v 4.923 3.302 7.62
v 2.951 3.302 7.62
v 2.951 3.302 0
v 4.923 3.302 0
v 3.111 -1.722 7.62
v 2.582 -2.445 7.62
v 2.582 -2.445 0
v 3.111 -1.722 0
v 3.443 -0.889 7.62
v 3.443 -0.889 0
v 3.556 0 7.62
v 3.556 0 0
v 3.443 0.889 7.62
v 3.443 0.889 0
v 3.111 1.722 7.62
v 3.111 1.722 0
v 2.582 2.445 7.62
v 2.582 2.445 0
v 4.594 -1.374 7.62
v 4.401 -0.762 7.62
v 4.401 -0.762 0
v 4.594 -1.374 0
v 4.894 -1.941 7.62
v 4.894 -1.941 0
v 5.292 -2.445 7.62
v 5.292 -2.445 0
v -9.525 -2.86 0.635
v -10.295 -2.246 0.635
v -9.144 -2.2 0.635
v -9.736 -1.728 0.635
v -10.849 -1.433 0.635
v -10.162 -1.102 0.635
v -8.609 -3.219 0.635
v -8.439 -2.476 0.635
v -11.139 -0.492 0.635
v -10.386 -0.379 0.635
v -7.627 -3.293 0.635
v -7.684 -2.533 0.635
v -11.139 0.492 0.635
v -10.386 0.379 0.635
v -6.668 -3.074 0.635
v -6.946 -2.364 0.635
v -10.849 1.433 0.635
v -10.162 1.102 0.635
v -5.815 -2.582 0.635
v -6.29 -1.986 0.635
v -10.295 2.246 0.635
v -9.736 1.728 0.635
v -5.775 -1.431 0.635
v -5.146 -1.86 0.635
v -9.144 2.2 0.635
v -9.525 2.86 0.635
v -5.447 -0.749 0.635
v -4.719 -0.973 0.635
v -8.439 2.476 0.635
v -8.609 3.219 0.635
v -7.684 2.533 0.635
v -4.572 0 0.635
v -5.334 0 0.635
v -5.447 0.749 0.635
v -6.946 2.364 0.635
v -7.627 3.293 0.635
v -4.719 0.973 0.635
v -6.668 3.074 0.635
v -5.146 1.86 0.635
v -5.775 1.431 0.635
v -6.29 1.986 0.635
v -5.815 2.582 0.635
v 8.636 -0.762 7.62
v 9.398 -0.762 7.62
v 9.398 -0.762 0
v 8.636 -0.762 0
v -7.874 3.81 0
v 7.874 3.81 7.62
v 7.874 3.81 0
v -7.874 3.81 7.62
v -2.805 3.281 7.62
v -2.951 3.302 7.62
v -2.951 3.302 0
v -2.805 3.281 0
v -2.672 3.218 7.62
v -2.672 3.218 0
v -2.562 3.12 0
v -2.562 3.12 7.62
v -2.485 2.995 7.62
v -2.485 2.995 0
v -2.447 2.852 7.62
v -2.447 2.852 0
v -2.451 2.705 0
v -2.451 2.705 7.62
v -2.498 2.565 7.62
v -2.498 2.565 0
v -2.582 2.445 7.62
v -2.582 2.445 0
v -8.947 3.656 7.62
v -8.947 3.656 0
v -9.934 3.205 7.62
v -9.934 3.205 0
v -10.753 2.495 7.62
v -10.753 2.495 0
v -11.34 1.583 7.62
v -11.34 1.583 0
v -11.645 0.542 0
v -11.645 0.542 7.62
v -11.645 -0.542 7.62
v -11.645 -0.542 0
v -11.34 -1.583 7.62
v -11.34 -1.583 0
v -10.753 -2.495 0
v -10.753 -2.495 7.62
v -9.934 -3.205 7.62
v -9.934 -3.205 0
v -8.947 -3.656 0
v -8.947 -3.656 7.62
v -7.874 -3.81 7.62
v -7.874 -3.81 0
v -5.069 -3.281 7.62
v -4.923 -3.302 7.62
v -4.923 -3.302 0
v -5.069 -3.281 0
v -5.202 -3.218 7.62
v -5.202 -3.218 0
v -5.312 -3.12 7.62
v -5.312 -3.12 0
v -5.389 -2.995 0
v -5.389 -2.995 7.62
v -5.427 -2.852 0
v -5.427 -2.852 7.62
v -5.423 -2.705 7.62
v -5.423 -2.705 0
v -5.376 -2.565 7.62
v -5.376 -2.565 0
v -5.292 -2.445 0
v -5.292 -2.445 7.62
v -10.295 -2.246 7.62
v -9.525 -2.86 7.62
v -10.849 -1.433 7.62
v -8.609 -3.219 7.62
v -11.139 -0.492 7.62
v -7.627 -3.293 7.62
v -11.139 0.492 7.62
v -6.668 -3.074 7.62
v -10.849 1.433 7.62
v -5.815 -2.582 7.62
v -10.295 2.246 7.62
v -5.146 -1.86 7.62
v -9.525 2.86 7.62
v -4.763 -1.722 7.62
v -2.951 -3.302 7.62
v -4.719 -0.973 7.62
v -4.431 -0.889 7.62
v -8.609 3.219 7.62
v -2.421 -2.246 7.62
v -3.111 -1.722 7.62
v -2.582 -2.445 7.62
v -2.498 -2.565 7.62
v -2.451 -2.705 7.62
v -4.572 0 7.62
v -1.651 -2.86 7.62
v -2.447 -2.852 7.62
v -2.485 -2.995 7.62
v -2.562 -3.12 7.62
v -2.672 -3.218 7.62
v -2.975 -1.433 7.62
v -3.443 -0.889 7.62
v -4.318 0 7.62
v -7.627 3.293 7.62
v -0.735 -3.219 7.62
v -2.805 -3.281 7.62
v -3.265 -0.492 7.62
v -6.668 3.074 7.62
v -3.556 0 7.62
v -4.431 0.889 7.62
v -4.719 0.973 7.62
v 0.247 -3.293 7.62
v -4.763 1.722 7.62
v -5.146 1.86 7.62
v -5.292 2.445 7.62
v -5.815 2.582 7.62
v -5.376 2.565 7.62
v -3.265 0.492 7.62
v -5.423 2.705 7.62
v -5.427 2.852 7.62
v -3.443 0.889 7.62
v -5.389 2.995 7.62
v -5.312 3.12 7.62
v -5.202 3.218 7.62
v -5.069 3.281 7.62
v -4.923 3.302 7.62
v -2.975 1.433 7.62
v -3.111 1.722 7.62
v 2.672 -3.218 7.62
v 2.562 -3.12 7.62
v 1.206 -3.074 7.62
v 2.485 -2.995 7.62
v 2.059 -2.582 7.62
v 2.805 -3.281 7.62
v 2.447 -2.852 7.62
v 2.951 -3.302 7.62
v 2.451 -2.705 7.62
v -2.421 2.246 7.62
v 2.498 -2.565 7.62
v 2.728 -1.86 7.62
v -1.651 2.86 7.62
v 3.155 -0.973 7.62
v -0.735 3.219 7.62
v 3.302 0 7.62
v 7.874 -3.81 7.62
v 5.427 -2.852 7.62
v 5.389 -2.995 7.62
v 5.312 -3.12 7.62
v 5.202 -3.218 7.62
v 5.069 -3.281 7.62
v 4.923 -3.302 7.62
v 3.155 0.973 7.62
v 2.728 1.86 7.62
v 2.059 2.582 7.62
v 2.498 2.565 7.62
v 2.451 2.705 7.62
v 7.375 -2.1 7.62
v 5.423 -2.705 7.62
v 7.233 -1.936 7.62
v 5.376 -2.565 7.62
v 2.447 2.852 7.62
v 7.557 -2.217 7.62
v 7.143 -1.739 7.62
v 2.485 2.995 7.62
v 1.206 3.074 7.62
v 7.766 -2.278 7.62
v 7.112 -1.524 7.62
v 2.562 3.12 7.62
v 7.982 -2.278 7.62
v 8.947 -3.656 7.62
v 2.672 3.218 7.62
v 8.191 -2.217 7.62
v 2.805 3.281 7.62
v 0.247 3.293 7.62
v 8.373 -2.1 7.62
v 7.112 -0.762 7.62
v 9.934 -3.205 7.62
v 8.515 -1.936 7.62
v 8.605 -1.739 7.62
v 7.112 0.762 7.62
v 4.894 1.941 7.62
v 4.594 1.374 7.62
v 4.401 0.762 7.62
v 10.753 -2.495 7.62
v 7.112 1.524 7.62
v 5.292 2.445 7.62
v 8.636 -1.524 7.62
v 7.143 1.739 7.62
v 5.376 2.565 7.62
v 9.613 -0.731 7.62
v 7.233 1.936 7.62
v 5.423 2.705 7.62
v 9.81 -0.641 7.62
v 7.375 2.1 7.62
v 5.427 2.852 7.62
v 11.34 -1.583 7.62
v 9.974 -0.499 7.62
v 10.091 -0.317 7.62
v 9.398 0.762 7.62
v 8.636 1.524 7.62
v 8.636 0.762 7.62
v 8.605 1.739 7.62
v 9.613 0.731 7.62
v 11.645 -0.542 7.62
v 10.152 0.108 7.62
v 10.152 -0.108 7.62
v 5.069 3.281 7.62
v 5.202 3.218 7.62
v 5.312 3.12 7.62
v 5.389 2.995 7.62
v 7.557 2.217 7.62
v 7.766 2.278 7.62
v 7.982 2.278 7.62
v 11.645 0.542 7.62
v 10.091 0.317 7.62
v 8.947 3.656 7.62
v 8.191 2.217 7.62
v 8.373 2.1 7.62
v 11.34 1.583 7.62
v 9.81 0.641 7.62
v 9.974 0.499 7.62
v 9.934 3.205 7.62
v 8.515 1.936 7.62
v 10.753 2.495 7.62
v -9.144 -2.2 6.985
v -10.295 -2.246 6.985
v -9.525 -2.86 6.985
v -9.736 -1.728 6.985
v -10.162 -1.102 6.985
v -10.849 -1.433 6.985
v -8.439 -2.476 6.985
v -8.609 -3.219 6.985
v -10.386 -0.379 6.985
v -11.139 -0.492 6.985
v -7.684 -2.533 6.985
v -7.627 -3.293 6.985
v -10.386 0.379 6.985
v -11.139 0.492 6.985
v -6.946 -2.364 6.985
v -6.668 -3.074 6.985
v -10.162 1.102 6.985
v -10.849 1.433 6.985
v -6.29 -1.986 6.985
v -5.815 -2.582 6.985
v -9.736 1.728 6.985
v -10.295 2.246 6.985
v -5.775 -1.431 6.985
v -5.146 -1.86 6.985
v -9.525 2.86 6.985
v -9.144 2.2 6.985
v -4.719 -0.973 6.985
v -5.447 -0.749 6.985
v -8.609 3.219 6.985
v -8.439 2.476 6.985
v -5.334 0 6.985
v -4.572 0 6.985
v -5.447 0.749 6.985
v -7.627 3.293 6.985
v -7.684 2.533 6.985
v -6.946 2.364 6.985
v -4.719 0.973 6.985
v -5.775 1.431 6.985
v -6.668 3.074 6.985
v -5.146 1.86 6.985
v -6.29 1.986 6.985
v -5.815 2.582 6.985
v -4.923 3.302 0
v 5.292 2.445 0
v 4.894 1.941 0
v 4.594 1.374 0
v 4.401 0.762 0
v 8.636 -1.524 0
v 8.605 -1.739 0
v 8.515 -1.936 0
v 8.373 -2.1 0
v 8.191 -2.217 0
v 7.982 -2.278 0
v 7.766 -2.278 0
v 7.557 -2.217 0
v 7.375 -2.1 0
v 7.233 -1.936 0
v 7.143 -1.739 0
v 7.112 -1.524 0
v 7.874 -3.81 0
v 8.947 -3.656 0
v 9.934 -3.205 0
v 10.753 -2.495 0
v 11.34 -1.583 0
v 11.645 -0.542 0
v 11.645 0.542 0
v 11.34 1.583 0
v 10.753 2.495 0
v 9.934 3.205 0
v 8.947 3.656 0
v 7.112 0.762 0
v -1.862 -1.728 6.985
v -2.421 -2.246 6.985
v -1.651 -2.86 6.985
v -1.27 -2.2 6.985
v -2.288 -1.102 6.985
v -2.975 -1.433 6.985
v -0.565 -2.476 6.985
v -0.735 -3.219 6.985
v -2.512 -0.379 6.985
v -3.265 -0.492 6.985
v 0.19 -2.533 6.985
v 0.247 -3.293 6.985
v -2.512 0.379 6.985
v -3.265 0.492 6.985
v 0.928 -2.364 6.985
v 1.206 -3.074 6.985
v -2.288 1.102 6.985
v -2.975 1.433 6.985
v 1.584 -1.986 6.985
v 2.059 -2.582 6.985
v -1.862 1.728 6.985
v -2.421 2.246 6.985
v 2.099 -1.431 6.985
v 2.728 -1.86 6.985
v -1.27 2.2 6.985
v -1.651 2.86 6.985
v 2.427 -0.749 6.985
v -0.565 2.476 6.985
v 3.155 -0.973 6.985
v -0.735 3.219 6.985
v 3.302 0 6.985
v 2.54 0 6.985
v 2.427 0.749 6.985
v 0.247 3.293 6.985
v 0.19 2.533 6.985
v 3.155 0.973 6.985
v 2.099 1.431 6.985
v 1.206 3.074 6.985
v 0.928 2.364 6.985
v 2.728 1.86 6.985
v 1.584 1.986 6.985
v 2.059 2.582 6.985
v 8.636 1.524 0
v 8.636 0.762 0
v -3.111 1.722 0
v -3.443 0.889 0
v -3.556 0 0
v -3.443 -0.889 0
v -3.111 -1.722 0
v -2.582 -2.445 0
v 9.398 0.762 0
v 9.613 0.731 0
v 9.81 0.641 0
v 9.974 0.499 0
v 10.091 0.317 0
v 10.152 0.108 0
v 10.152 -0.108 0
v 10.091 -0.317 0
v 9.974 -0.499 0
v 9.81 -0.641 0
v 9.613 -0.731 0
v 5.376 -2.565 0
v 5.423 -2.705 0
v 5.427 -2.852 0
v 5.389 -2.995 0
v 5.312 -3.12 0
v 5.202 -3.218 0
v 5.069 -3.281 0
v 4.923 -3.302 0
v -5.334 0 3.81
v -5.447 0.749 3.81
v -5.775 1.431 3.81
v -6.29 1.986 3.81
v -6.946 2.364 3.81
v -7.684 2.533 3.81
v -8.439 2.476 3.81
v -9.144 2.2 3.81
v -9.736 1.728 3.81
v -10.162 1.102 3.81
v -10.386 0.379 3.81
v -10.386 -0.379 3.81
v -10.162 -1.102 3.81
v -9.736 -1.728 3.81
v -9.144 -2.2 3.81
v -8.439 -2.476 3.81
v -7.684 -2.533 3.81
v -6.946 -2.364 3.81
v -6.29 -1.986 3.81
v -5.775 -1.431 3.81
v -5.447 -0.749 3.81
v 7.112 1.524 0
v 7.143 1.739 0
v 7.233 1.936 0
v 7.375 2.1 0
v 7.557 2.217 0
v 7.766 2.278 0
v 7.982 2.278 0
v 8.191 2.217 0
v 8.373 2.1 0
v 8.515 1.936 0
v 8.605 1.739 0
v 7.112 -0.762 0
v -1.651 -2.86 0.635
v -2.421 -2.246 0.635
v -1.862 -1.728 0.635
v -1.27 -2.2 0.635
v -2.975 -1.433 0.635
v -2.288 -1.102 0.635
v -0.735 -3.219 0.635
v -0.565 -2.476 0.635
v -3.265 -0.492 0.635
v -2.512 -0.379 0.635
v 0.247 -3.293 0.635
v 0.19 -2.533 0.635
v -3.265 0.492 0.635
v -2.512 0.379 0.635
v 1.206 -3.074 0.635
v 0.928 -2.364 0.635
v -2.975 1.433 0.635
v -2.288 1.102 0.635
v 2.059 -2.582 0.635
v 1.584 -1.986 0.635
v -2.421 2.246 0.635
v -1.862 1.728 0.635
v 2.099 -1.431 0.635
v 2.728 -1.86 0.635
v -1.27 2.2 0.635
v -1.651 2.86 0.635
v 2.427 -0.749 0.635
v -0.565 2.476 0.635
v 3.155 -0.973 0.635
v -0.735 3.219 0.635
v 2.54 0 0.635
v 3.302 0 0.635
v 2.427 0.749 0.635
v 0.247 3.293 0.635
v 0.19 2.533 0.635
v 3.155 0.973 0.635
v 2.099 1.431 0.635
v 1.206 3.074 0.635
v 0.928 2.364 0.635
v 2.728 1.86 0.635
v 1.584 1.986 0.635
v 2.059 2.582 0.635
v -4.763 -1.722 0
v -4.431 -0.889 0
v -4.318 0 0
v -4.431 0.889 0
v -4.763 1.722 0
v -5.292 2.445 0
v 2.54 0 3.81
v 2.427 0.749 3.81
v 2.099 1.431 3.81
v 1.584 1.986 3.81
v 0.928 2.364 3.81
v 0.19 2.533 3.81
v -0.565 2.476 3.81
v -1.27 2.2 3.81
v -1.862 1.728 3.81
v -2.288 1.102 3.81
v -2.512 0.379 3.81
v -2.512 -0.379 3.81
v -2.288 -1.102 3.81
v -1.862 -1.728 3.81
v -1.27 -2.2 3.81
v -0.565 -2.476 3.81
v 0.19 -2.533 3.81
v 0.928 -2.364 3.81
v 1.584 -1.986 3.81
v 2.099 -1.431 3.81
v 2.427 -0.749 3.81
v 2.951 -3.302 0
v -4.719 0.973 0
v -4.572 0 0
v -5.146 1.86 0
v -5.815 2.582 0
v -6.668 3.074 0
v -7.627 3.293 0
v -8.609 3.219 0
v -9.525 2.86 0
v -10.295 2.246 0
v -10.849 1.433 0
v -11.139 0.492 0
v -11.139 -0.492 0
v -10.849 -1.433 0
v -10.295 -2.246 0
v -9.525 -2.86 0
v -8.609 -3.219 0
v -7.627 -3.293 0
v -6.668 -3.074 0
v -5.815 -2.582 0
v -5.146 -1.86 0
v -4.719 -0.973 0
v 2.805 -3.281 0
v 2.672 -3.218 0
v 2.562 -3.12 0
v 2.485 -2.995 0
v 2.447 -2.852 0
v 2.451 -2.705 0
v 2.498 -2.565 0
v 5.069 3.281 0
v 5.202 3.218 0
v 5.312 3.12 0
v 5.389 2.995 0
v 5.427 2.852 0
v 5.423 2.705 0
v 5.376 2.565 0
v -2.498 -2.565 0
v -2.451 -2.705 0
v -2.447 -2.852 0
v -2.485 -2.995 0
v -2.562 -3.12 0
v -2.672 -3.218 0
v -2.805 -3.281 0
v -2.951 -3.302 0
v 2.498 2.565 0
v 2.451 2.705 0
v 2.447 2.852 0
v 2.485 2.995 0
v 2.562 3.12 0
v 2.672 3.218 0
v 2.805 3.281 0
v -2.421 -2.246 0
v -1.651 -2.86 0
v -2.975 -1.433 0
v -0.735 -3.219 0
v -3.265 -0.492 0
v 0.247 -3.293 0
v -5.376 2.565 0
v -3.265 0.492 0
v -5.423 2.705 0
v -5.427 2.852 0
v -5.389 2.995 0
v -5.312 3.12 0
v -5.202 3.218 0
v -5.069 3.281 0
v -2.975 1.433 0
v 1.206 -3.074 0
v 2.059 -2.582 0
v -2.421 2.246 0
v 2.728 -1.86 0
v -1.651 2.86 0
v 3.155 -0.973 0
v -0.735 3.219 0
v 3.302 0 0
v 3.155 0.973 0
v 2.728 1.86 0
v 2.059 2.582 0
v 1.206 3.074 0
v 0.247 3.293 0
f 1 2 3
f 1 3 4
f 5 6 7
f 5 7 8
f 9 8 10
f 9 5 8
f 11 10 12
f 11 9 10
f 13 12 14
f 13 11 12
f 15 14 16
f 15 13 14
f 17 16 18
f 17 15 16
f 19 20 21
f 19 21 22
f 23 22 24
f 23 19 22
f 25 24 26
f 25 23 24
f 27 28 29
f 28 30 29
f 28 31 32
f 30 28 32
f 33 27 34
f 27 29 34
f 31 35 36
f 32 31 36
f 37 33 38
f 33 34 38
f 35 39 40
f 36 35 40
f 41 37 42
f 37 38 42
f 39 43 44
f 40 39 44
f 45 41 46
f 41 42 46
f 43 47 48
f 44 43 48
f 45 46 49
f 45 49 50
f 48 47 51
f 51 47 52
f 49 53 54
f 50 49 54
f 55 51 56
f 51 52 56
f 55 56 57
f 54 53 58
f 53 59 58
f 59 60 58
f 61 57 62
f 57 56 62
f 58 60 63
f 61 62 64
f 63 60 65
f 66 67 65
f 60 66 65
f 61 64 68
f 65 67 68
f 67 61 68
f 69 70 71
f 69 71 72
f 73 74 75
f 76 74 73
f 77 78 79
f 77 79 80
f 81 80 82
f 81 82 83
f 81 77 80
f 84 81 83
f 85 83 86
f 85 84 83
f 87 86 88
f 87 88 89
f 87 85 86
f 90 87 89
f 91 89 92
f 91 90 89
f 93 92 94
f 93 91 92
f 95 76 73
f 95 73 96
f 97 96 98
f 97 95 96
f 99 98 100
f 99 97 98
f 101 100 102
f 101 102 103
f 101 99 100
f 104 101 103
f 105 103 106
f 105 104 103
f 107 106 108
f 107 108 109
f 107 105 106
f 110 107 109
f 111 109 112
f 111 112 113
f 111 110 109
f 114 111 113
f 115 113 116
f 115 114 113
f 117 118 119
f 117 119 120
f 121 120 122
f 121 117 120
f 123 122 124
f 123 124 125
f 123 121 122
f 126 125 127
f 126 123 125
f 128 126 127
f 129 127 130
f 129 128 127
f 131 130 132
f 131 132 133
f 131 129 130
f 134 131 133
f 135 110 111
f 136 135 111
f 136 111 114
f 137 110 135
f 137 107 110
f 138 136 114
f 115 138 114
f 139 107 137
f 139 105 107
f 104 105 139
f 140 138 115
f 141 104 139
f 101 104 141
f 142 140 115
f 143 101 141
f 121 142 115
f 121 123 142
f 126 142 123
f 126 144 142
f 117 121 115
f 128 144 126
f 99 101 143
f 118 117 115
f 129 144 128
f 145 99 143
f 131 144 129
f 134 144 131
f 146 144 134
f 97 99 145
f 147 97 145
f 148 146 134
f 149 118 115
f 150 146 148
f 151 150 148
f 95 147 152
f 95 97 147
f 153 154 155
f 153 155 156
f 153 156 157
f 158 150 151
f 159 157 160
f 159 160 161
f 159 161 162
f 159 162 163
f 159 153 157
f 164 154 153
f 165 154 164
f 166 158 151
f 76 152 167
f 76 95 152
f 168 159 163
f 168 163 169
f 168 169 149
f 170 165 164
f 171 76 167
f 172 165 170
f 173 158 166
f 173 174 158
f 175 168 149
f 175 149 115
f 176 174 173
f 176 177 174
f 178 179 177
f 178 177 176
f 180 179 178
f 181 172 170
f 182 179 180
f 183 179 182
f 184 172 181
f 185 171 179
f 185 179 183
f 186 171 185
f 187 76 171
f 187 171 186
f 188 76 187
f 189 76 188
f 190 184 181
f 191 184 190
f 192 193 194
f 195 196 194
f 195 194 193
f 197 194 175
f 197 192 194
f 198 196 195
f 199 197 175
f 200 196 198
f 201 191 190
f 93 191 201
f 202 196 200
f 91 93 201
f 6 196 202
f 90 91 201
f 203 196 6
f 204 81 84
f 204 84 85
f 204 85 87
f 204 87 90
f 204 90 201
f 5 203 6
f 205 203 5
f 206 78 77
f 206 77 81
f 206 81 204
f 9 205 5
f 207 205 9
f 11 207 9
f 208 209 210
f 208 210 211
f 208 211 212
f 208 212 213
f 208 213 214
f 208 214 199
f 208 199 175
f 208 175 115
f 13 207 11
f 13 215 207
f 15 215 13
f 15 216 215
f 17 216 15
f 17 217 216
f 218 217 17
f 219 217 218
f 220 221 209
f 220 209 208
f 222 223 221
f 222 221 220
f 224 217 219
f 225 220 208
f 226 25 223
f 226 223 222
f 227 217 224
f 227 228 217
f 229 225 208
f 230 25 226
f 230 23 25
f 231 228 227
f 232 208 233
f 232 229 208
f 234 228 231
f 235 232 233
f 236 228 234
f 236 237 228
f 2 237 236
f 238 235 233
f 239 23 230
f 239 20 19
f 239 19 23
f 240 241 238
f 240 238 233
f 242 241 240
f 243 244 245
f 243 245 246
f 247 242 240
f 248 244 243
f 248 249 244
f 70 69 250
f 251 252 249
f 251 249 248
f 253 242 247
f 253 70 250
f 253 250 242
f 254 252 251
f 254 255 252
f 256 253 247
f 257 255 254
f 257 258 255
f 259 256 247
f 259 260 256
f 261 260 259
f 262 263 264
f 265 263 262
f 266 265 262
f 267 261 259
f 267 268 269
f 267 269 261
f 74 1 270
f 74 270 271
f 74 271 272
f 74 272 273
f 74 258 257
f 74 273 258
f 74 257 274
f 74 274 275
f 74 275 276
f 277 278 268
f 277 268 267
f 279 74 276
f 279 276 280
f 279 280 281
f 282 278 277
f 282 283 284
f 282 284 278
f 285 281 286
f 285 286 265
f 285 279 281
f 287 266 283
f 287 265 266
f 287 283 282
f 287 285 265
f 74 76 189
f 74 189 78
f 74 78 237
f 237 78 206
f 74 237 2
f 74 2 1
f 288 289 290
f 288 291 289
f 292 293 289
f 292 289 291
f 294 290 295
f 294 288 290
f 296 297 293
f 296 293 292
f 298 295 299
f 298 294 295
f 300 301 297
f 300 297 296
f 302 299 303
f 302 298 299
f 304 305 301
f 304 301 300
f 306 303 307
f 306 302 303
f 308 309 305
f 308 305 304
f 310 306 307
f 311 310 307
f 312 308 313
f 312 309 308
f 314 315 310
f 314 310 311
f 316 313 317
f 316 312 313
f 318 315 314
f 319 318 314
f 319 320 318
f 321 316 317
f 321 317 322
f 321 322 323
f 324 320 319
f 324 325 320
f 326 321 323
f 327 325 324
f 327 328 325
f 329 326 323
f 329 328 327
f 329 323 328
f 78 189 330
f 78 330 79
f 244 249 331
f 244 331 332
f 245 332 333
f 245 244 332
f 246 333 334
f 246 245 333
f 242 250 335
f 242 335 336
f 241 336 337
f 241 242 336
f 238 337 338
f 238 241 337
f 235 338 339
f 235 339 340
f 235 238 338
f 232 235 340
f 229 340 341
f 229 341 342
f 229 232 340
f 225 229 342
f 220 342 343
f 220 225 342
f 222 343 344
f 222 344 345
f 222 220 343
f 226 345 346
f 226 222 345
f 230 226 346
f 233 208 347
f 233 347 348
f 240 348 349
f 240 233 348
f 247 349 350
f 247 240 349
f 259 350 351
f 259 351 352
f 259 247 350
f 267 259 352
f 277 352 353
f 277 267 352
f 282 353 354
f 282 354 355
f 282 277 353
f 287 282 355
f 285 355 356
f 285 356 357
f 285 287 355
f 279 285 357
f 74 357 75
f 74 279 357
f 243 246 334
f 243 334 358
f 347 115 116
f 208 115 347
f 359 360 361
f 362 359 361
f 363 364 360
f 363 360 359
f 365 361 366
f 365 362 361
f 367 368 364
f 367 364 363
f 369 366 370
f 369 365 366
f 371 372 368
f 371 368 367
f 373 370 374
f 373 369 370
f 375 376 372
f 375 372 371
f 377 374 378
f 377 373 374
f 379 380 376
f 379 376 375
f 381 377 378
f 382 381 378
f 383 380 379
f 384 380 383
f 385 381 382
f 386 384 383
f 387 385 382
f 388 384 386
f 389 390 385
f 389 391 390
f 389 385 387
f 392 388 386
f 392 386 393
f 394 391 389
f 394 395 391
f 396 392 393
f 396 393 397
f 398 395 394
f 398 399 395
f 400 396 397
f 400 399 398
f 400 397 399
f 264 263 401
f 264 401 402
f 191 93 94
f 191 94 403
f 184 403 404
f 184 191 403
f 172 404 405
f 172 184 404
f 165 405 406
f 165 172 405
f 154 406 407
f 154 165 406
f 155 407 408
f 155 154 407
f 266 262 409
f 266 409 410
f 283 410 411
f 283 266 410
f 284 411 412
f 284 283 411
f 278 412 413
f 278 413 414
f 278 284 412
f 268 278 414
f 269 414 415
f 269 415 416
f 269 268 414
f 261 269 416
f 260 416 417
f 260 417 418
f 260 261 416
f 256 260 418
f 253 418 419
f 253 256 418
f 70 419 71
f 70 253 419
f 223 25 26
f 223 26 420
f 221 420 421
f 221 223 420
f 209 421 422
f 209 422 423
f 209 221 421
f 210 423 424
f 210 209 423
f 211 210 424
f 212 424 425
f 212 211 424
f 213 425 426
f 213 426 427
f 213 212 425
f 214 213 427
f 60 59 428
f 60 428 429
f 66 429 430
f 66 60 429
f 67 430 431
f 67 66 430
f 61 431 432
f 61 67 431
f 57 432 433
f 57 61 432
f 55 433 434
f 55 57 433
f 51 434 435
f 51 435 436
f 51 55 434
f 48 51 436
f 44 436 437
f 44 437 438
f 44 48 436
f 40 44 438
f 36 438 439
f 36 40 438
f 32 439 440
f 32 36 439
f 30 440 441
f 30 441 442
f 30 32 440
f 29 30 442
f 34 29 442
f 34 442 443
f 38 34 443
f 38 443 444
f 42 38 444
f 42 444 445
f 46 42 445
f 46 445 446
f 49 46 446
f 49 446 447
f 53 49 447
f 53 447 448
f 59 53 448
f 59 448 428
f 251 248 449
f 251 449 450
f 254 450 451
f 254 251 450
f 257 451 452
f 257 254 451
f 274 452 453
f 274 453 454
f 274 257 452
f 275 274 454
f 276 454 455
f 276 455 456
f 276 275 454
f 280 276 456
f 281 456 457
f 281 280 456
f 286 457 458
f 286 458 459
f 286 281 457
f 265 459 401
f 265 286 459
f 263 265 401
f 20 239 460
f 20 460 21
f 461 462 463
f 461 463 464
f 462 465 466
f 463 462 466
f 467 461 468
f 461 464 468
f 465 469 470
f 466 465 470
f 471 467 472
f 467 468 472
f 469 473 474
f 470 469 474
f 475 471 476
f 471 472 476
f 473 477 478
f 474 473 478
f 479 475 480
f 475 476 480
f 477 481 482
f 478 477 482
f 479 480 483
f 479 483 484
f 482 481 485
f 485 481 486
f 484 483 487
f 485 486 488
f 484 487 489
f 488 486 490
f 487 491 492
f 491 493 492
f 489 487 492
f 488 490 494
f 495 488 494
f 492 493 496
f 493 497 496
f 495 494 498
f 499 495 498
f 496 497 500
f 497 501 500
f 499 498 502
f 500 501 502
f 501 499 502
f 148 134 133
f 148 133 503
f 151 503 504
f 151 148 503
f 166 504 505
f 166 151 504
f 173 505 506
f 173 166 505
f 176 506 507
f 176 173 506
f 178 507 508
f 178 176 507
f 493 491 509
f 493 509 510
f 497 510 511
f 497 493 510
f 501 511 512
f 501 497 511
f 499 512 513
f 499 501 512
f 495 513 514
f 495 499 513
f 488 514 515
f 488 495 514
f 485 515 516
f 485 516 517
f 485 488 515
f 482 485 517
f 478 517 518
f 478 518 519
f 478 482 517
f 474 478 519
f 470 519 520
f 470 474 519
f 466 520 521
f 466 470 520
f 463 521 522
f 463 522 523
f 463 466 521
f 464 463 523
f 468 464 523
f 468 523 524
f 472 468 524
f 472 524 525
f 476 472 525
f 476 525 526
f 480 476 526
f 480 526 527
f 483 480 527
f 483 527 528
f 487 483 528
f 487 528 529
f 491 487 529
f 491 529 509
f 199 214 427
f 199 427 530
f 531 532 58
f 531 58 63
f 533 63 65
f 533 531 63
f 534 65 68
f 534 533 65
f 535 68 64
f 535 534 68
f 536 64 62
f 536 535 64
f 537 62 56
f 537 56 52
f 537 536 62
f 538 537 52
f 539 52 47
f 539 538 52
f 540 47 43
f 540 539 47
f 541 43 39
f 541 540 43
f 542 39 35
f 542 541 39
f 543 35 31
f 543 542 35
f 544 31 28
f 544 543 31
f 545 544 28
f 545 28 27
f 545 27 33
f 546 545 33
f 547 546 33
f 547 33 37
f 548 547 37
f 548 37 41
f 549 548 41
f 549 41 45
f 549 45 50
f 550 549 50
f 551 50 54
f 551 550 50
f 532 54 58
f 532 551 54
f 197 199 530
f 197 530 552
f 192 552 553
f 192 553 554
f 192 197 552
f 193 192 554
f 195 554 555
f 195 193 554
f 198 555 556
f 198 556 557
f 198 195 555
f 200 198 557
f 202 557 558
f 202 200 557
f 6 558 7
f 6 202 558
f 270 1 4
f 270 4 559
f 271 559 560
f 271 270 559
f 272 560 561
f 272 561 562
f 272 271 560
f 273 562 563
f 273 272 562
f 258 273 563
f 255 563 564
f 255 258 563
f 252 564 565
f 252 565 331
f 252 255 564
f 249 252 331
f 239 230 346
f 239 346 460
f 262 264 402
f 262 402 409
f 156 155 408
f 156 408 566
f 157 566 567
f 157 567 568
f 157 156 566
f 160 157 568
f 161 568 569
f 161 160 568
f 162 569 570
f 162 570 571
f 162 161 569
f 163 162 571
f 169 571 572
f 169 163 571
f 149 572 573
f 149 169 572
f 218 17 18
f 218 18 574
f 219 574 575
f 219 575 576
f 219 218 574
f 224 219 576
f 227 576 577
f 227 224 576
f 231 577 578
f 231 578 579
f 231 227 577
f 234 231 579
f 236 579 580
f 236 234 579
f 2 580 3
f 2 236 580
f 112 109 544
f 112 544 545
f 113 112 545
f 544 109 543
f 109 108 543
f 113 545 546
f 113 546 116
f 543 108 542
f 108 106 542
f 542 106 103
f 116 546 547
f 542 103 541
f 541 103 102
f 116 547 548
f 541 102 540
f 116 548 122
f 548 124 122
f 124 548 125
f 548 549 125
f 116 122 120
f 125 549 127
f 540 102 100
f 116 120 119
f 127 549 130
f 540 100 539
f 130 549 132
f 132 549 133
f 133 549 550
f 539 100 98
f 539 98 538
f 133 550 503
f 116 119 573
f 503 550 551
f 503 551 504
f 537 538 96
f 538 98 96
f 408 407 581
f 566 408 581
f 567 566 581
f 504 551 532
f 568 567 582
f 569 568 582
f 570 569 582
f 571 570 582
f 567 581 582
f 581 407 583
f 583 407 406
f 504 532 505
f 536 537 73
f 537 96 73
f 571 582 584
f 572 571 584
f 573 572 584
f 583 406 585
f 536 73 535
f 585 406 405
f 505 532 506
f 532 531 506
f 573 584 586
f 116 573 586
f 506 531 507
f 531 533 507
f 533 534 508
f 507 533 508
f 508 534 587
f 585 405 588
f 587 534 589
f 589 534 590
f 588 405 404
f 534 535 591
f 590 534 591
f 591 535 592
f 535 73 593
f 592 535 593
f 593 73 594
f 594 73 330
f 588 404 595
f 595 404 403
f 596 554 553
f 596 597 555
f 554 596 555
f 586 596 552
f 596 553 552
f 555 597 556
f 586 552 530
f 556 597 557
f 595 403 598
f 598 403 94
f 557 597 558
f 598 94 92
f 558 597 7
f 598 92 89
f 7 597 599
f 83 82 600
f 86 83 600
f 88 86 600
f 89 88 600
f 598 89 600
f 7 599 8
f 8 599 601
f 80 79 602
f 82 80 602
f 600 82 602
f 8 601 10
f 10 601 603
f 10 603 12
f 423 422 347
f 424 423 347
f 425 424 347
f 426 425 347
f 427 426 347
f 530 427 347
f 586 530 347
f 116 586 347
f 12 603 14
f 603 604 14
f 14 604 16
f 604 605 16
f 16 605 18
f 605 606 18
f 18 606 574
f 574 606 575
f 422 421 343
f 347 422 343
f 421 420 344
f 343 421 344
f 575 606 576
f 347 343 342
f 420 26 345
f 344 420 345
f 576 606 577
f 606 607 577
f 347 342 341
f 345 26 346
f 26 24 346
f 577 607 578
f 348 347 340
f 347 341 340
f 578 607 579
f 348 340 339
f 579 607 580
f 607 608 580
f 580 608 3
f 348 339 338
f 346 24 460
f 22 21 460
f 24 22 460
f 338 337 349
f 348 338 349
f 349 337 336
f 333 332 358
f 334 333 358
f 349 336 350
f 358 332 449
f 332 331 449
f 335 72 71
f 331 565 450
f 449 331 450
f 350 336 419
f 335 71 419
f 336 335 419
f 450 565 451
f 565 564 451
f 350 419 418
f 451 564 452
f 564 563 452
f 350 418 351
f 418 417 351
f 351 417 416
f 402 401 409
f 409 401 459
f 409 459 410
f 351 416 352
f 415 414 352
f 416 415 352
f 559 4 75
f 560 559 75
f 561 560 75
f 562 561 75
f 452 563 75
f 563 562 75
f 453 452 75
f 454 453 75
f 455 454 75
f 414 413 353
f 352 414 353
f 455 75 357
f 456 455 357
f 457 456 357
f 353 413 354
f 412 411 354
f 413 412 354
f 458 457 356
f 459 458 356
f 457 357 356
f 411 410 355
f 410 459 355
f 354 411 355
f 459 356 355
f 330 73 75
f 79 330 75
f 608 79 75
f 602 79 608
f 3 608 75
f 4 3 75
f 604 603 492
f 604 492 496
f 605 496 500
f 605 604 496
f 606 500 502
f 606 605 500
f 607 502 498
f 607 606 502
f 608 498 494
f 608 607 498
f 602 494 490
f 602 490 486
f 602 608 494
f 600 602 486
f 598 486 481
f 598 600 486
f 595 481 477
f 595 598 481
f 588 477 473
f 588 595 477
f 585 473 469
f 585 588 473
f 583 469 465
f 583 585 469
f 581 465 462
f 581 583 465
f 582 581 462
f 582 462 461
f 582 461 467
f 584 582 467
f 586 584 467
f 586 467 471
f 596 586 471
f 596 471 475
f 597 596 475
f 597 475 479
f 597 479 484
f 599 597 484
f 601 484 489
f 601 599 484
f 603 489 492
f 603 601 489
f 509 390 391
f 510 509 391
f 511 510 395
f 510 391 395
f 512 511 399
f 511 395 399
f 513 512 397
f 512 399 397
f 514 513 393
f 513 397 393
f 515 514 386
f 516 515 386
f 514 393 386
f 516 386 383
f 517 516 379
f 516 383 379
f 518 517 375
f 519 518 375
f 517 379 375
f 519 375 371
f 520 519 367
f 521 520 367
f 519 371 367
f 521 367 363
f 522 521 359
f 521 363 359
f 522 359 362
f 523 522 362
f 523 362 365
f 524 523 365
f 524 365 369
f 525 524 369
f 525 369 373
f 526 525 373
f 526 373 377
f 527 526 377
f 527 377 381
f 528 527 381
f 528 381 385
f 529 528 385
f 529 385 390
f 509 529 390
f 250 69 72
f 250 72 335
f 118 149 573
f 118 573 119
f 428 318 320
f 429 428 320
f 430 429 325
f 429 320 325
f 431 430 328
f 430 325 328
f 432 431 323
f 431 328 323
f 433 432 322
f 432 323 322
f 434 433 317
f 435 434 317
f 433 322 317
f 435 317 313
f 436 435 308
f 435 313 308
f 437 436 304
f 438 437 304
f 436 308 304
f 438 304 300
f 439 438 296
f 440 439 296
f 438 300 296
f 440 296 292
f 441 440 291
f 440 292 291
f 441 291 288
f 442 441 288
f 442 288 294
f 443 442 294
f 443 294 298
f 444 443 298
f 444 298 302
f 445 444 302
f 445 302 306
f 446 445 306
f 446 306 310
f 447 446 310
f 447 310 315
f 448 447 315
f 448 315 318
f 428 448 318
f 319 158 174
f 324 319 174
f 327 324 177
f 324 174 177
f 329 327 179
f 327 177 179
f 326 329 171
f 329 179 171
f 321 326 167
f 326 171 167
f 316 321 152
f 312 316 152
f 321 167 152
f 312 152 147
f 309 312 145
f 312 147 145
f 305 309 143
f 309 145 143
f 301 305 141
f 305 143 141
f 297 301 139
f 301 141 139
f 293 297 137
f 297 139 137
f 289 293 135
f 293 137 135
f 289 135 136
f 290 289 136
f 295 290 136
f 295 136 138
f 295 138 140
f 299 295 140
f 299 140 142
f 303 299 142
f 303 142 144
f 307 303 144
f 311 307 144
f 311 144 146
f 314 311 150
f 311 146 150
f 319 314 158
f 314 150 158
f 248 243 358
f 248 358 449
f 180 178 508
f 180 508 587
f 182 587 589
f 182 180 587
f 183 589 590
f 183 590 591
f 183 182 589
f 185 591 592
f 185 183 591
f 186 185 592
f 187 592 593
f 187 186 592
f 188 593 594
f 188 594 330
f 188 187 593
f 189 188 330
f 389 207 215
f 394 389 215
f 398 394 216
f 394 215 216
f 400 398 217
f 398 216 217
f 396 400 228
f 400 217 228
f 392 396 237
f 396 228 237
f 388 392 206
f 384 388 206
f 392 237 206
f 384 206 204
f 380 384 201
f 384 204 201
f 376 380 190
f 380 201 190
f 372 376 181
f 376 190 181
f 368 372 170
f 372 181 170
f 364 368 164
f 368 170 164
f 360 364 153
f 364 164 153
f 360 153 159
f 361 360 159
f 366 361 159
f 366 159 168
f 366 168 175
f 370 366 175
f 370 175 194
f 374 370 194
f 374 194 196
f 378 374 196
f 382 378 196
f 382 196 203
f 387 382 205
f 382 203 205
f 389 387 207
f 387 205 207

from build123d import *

# Parameters (mm, degrees)
SKETCH1_R           = 2.54
BOSS_EXTRUDE1_DEPTH = 3.81
SKETCH2_R           = 3.302
CUT_EXTRUDE3_DEPTH  = 0.635


with BuildPart() as part:
    # Sketch1 → Boss-Extrude1 (new body)
    with BuildSketch(Plane.XY):
        with BuildLine():
            ThreePointArc((7.874, -3.81), (11.684, 0), (7.874, 3.81))
            Line((7.874, 3.81), (-7.874, 3.81))
            ThreePointArc((-7.874, 3.81), (-11.684, 0), (-7.874, -3.81))
            Line((-7.874, -3.81), (7.874, -3.81))
        make_face()
        with BuildLine():
            ThreePointArc((-2.95121331, 3.302), (-2.484585514, 2.994804631), (-2.582311646, 2.44475))
            ThreePointArc((-2.582311646, 2.44475), (-3.556, 0), (-2.582311646, -2.44475))
            ThreePointArc((-2.582311646, -2.44475), (-2.484585514, -2.994804631), (-2.95121331, -3.302))
            Line((-2.95121331, -3.302), (-4.92278669, -3.302))
            ThreePointArc((-4.92278669, -3.302), (-5.389414486, -2.994804631), (-5.291688354, -2.44475))
            ThreePointArc((-5.291688354, -2.44475), (-4.318, 0), (-5.291688354, 2.44475))
            ThreePointArc((-5.291688354, 2.44475), (-5.389414486, 2.994804631), (-4.92278669, 3.302))
            Line((-4.92278669, 3.302), (-2.95121331, 3.302))
        make_face(mode=Mode.SUBTRACT)
        Circle(SKETCH1_R, mode=Mode.SUBTRACT)
        with BuildLine():
            Line((4.92278669, -3.302), (2.95121331, -3.302))
            ThreePointArc((2.95121331, -3.302), (2.484585514, -2.994804631), (2.582311646, -2.44475))
            ThreePointArc((2.582311646, -2.44475), (3.556, 0), (2.582311646, 2.44475))
            ThreePointArc((2.582311646, 2.44475), (2.484585514, 2.994804631), (2.95121331, 3.302))
            Line((2.95121331, 3.302), (4.92278669, 3.302))
            ThreePointArc((4.92278669, 3.302), (5.389414486, 2.994804631), (5.291688354, 2.44475))
            ThreePointArc((5.291688354, 2.44475), (4.731418896, 1.664127401), (4.40060224, 0.762))
            Line((4.40060224, 0.762), (7.112, 0.762))
            Line((7.112, 0.762), (7.112, 1.524))
            ThreePointArc((7.112, 1.524), (7.874, 2.286), (8.636, 1.524))
            Line((8.636, 1.524), (8.636, 0.762))
            Line((8.636, 0.762), (9.398, 0.762))
            ThreePointArc((9.398, 0.762), (10.16, 0), (9.398, -0.762))
            Line((9.398, -0.762), (8.636, -0.762))
            Line((8.636, -0.762), (8.636, -1.524))
            ThreePointArc((8.636, -1.524), (7.874, -2.286), (7.112, -1.524))
            Line((7.112, -1.524), (7.112, -0.762))
            Line((7.112, -0.762), (4.40060224, -0.762))
            ThreePointArc((4.40060224, -0.762), (4.731418896, -1.664127401), (5.291688354, -2.44475))
            ThreePointArc((5.291688354, -2.44475), (5.389414486, -2.994804631), (4.92278669, -3.302))
        make_face(mode=Mode.SUBTRACT)
        with Locations((-7.874, 0)):
            Circle(SKETCH1_R, mode=Mode.SUBTRACT)
    extrude(amount=BOSS_EXTRUDE1_DEPTH)

    # Sketch2 → Cut-Extrude3 (cut)
    with BuildSketch(Plane.XY):
        Circle(SKETCH2_R)
        with Locations((-7.874, 0)):
            Circle(SKETCH2_R)
    extrude(amount=CUT_EXTRUDE3_DEPTH, mode=Mode.SUBTRACT)

    # Mirror1: part across face


with BuildPart() as part_1:
    add(part.part)
    add(part.part.mirror(Plane(origin=(0.730328886, 0, 3.81), x_dir=(1, 0, 0), z_dir=(0, 0, 1))))


solid = part_1.part
